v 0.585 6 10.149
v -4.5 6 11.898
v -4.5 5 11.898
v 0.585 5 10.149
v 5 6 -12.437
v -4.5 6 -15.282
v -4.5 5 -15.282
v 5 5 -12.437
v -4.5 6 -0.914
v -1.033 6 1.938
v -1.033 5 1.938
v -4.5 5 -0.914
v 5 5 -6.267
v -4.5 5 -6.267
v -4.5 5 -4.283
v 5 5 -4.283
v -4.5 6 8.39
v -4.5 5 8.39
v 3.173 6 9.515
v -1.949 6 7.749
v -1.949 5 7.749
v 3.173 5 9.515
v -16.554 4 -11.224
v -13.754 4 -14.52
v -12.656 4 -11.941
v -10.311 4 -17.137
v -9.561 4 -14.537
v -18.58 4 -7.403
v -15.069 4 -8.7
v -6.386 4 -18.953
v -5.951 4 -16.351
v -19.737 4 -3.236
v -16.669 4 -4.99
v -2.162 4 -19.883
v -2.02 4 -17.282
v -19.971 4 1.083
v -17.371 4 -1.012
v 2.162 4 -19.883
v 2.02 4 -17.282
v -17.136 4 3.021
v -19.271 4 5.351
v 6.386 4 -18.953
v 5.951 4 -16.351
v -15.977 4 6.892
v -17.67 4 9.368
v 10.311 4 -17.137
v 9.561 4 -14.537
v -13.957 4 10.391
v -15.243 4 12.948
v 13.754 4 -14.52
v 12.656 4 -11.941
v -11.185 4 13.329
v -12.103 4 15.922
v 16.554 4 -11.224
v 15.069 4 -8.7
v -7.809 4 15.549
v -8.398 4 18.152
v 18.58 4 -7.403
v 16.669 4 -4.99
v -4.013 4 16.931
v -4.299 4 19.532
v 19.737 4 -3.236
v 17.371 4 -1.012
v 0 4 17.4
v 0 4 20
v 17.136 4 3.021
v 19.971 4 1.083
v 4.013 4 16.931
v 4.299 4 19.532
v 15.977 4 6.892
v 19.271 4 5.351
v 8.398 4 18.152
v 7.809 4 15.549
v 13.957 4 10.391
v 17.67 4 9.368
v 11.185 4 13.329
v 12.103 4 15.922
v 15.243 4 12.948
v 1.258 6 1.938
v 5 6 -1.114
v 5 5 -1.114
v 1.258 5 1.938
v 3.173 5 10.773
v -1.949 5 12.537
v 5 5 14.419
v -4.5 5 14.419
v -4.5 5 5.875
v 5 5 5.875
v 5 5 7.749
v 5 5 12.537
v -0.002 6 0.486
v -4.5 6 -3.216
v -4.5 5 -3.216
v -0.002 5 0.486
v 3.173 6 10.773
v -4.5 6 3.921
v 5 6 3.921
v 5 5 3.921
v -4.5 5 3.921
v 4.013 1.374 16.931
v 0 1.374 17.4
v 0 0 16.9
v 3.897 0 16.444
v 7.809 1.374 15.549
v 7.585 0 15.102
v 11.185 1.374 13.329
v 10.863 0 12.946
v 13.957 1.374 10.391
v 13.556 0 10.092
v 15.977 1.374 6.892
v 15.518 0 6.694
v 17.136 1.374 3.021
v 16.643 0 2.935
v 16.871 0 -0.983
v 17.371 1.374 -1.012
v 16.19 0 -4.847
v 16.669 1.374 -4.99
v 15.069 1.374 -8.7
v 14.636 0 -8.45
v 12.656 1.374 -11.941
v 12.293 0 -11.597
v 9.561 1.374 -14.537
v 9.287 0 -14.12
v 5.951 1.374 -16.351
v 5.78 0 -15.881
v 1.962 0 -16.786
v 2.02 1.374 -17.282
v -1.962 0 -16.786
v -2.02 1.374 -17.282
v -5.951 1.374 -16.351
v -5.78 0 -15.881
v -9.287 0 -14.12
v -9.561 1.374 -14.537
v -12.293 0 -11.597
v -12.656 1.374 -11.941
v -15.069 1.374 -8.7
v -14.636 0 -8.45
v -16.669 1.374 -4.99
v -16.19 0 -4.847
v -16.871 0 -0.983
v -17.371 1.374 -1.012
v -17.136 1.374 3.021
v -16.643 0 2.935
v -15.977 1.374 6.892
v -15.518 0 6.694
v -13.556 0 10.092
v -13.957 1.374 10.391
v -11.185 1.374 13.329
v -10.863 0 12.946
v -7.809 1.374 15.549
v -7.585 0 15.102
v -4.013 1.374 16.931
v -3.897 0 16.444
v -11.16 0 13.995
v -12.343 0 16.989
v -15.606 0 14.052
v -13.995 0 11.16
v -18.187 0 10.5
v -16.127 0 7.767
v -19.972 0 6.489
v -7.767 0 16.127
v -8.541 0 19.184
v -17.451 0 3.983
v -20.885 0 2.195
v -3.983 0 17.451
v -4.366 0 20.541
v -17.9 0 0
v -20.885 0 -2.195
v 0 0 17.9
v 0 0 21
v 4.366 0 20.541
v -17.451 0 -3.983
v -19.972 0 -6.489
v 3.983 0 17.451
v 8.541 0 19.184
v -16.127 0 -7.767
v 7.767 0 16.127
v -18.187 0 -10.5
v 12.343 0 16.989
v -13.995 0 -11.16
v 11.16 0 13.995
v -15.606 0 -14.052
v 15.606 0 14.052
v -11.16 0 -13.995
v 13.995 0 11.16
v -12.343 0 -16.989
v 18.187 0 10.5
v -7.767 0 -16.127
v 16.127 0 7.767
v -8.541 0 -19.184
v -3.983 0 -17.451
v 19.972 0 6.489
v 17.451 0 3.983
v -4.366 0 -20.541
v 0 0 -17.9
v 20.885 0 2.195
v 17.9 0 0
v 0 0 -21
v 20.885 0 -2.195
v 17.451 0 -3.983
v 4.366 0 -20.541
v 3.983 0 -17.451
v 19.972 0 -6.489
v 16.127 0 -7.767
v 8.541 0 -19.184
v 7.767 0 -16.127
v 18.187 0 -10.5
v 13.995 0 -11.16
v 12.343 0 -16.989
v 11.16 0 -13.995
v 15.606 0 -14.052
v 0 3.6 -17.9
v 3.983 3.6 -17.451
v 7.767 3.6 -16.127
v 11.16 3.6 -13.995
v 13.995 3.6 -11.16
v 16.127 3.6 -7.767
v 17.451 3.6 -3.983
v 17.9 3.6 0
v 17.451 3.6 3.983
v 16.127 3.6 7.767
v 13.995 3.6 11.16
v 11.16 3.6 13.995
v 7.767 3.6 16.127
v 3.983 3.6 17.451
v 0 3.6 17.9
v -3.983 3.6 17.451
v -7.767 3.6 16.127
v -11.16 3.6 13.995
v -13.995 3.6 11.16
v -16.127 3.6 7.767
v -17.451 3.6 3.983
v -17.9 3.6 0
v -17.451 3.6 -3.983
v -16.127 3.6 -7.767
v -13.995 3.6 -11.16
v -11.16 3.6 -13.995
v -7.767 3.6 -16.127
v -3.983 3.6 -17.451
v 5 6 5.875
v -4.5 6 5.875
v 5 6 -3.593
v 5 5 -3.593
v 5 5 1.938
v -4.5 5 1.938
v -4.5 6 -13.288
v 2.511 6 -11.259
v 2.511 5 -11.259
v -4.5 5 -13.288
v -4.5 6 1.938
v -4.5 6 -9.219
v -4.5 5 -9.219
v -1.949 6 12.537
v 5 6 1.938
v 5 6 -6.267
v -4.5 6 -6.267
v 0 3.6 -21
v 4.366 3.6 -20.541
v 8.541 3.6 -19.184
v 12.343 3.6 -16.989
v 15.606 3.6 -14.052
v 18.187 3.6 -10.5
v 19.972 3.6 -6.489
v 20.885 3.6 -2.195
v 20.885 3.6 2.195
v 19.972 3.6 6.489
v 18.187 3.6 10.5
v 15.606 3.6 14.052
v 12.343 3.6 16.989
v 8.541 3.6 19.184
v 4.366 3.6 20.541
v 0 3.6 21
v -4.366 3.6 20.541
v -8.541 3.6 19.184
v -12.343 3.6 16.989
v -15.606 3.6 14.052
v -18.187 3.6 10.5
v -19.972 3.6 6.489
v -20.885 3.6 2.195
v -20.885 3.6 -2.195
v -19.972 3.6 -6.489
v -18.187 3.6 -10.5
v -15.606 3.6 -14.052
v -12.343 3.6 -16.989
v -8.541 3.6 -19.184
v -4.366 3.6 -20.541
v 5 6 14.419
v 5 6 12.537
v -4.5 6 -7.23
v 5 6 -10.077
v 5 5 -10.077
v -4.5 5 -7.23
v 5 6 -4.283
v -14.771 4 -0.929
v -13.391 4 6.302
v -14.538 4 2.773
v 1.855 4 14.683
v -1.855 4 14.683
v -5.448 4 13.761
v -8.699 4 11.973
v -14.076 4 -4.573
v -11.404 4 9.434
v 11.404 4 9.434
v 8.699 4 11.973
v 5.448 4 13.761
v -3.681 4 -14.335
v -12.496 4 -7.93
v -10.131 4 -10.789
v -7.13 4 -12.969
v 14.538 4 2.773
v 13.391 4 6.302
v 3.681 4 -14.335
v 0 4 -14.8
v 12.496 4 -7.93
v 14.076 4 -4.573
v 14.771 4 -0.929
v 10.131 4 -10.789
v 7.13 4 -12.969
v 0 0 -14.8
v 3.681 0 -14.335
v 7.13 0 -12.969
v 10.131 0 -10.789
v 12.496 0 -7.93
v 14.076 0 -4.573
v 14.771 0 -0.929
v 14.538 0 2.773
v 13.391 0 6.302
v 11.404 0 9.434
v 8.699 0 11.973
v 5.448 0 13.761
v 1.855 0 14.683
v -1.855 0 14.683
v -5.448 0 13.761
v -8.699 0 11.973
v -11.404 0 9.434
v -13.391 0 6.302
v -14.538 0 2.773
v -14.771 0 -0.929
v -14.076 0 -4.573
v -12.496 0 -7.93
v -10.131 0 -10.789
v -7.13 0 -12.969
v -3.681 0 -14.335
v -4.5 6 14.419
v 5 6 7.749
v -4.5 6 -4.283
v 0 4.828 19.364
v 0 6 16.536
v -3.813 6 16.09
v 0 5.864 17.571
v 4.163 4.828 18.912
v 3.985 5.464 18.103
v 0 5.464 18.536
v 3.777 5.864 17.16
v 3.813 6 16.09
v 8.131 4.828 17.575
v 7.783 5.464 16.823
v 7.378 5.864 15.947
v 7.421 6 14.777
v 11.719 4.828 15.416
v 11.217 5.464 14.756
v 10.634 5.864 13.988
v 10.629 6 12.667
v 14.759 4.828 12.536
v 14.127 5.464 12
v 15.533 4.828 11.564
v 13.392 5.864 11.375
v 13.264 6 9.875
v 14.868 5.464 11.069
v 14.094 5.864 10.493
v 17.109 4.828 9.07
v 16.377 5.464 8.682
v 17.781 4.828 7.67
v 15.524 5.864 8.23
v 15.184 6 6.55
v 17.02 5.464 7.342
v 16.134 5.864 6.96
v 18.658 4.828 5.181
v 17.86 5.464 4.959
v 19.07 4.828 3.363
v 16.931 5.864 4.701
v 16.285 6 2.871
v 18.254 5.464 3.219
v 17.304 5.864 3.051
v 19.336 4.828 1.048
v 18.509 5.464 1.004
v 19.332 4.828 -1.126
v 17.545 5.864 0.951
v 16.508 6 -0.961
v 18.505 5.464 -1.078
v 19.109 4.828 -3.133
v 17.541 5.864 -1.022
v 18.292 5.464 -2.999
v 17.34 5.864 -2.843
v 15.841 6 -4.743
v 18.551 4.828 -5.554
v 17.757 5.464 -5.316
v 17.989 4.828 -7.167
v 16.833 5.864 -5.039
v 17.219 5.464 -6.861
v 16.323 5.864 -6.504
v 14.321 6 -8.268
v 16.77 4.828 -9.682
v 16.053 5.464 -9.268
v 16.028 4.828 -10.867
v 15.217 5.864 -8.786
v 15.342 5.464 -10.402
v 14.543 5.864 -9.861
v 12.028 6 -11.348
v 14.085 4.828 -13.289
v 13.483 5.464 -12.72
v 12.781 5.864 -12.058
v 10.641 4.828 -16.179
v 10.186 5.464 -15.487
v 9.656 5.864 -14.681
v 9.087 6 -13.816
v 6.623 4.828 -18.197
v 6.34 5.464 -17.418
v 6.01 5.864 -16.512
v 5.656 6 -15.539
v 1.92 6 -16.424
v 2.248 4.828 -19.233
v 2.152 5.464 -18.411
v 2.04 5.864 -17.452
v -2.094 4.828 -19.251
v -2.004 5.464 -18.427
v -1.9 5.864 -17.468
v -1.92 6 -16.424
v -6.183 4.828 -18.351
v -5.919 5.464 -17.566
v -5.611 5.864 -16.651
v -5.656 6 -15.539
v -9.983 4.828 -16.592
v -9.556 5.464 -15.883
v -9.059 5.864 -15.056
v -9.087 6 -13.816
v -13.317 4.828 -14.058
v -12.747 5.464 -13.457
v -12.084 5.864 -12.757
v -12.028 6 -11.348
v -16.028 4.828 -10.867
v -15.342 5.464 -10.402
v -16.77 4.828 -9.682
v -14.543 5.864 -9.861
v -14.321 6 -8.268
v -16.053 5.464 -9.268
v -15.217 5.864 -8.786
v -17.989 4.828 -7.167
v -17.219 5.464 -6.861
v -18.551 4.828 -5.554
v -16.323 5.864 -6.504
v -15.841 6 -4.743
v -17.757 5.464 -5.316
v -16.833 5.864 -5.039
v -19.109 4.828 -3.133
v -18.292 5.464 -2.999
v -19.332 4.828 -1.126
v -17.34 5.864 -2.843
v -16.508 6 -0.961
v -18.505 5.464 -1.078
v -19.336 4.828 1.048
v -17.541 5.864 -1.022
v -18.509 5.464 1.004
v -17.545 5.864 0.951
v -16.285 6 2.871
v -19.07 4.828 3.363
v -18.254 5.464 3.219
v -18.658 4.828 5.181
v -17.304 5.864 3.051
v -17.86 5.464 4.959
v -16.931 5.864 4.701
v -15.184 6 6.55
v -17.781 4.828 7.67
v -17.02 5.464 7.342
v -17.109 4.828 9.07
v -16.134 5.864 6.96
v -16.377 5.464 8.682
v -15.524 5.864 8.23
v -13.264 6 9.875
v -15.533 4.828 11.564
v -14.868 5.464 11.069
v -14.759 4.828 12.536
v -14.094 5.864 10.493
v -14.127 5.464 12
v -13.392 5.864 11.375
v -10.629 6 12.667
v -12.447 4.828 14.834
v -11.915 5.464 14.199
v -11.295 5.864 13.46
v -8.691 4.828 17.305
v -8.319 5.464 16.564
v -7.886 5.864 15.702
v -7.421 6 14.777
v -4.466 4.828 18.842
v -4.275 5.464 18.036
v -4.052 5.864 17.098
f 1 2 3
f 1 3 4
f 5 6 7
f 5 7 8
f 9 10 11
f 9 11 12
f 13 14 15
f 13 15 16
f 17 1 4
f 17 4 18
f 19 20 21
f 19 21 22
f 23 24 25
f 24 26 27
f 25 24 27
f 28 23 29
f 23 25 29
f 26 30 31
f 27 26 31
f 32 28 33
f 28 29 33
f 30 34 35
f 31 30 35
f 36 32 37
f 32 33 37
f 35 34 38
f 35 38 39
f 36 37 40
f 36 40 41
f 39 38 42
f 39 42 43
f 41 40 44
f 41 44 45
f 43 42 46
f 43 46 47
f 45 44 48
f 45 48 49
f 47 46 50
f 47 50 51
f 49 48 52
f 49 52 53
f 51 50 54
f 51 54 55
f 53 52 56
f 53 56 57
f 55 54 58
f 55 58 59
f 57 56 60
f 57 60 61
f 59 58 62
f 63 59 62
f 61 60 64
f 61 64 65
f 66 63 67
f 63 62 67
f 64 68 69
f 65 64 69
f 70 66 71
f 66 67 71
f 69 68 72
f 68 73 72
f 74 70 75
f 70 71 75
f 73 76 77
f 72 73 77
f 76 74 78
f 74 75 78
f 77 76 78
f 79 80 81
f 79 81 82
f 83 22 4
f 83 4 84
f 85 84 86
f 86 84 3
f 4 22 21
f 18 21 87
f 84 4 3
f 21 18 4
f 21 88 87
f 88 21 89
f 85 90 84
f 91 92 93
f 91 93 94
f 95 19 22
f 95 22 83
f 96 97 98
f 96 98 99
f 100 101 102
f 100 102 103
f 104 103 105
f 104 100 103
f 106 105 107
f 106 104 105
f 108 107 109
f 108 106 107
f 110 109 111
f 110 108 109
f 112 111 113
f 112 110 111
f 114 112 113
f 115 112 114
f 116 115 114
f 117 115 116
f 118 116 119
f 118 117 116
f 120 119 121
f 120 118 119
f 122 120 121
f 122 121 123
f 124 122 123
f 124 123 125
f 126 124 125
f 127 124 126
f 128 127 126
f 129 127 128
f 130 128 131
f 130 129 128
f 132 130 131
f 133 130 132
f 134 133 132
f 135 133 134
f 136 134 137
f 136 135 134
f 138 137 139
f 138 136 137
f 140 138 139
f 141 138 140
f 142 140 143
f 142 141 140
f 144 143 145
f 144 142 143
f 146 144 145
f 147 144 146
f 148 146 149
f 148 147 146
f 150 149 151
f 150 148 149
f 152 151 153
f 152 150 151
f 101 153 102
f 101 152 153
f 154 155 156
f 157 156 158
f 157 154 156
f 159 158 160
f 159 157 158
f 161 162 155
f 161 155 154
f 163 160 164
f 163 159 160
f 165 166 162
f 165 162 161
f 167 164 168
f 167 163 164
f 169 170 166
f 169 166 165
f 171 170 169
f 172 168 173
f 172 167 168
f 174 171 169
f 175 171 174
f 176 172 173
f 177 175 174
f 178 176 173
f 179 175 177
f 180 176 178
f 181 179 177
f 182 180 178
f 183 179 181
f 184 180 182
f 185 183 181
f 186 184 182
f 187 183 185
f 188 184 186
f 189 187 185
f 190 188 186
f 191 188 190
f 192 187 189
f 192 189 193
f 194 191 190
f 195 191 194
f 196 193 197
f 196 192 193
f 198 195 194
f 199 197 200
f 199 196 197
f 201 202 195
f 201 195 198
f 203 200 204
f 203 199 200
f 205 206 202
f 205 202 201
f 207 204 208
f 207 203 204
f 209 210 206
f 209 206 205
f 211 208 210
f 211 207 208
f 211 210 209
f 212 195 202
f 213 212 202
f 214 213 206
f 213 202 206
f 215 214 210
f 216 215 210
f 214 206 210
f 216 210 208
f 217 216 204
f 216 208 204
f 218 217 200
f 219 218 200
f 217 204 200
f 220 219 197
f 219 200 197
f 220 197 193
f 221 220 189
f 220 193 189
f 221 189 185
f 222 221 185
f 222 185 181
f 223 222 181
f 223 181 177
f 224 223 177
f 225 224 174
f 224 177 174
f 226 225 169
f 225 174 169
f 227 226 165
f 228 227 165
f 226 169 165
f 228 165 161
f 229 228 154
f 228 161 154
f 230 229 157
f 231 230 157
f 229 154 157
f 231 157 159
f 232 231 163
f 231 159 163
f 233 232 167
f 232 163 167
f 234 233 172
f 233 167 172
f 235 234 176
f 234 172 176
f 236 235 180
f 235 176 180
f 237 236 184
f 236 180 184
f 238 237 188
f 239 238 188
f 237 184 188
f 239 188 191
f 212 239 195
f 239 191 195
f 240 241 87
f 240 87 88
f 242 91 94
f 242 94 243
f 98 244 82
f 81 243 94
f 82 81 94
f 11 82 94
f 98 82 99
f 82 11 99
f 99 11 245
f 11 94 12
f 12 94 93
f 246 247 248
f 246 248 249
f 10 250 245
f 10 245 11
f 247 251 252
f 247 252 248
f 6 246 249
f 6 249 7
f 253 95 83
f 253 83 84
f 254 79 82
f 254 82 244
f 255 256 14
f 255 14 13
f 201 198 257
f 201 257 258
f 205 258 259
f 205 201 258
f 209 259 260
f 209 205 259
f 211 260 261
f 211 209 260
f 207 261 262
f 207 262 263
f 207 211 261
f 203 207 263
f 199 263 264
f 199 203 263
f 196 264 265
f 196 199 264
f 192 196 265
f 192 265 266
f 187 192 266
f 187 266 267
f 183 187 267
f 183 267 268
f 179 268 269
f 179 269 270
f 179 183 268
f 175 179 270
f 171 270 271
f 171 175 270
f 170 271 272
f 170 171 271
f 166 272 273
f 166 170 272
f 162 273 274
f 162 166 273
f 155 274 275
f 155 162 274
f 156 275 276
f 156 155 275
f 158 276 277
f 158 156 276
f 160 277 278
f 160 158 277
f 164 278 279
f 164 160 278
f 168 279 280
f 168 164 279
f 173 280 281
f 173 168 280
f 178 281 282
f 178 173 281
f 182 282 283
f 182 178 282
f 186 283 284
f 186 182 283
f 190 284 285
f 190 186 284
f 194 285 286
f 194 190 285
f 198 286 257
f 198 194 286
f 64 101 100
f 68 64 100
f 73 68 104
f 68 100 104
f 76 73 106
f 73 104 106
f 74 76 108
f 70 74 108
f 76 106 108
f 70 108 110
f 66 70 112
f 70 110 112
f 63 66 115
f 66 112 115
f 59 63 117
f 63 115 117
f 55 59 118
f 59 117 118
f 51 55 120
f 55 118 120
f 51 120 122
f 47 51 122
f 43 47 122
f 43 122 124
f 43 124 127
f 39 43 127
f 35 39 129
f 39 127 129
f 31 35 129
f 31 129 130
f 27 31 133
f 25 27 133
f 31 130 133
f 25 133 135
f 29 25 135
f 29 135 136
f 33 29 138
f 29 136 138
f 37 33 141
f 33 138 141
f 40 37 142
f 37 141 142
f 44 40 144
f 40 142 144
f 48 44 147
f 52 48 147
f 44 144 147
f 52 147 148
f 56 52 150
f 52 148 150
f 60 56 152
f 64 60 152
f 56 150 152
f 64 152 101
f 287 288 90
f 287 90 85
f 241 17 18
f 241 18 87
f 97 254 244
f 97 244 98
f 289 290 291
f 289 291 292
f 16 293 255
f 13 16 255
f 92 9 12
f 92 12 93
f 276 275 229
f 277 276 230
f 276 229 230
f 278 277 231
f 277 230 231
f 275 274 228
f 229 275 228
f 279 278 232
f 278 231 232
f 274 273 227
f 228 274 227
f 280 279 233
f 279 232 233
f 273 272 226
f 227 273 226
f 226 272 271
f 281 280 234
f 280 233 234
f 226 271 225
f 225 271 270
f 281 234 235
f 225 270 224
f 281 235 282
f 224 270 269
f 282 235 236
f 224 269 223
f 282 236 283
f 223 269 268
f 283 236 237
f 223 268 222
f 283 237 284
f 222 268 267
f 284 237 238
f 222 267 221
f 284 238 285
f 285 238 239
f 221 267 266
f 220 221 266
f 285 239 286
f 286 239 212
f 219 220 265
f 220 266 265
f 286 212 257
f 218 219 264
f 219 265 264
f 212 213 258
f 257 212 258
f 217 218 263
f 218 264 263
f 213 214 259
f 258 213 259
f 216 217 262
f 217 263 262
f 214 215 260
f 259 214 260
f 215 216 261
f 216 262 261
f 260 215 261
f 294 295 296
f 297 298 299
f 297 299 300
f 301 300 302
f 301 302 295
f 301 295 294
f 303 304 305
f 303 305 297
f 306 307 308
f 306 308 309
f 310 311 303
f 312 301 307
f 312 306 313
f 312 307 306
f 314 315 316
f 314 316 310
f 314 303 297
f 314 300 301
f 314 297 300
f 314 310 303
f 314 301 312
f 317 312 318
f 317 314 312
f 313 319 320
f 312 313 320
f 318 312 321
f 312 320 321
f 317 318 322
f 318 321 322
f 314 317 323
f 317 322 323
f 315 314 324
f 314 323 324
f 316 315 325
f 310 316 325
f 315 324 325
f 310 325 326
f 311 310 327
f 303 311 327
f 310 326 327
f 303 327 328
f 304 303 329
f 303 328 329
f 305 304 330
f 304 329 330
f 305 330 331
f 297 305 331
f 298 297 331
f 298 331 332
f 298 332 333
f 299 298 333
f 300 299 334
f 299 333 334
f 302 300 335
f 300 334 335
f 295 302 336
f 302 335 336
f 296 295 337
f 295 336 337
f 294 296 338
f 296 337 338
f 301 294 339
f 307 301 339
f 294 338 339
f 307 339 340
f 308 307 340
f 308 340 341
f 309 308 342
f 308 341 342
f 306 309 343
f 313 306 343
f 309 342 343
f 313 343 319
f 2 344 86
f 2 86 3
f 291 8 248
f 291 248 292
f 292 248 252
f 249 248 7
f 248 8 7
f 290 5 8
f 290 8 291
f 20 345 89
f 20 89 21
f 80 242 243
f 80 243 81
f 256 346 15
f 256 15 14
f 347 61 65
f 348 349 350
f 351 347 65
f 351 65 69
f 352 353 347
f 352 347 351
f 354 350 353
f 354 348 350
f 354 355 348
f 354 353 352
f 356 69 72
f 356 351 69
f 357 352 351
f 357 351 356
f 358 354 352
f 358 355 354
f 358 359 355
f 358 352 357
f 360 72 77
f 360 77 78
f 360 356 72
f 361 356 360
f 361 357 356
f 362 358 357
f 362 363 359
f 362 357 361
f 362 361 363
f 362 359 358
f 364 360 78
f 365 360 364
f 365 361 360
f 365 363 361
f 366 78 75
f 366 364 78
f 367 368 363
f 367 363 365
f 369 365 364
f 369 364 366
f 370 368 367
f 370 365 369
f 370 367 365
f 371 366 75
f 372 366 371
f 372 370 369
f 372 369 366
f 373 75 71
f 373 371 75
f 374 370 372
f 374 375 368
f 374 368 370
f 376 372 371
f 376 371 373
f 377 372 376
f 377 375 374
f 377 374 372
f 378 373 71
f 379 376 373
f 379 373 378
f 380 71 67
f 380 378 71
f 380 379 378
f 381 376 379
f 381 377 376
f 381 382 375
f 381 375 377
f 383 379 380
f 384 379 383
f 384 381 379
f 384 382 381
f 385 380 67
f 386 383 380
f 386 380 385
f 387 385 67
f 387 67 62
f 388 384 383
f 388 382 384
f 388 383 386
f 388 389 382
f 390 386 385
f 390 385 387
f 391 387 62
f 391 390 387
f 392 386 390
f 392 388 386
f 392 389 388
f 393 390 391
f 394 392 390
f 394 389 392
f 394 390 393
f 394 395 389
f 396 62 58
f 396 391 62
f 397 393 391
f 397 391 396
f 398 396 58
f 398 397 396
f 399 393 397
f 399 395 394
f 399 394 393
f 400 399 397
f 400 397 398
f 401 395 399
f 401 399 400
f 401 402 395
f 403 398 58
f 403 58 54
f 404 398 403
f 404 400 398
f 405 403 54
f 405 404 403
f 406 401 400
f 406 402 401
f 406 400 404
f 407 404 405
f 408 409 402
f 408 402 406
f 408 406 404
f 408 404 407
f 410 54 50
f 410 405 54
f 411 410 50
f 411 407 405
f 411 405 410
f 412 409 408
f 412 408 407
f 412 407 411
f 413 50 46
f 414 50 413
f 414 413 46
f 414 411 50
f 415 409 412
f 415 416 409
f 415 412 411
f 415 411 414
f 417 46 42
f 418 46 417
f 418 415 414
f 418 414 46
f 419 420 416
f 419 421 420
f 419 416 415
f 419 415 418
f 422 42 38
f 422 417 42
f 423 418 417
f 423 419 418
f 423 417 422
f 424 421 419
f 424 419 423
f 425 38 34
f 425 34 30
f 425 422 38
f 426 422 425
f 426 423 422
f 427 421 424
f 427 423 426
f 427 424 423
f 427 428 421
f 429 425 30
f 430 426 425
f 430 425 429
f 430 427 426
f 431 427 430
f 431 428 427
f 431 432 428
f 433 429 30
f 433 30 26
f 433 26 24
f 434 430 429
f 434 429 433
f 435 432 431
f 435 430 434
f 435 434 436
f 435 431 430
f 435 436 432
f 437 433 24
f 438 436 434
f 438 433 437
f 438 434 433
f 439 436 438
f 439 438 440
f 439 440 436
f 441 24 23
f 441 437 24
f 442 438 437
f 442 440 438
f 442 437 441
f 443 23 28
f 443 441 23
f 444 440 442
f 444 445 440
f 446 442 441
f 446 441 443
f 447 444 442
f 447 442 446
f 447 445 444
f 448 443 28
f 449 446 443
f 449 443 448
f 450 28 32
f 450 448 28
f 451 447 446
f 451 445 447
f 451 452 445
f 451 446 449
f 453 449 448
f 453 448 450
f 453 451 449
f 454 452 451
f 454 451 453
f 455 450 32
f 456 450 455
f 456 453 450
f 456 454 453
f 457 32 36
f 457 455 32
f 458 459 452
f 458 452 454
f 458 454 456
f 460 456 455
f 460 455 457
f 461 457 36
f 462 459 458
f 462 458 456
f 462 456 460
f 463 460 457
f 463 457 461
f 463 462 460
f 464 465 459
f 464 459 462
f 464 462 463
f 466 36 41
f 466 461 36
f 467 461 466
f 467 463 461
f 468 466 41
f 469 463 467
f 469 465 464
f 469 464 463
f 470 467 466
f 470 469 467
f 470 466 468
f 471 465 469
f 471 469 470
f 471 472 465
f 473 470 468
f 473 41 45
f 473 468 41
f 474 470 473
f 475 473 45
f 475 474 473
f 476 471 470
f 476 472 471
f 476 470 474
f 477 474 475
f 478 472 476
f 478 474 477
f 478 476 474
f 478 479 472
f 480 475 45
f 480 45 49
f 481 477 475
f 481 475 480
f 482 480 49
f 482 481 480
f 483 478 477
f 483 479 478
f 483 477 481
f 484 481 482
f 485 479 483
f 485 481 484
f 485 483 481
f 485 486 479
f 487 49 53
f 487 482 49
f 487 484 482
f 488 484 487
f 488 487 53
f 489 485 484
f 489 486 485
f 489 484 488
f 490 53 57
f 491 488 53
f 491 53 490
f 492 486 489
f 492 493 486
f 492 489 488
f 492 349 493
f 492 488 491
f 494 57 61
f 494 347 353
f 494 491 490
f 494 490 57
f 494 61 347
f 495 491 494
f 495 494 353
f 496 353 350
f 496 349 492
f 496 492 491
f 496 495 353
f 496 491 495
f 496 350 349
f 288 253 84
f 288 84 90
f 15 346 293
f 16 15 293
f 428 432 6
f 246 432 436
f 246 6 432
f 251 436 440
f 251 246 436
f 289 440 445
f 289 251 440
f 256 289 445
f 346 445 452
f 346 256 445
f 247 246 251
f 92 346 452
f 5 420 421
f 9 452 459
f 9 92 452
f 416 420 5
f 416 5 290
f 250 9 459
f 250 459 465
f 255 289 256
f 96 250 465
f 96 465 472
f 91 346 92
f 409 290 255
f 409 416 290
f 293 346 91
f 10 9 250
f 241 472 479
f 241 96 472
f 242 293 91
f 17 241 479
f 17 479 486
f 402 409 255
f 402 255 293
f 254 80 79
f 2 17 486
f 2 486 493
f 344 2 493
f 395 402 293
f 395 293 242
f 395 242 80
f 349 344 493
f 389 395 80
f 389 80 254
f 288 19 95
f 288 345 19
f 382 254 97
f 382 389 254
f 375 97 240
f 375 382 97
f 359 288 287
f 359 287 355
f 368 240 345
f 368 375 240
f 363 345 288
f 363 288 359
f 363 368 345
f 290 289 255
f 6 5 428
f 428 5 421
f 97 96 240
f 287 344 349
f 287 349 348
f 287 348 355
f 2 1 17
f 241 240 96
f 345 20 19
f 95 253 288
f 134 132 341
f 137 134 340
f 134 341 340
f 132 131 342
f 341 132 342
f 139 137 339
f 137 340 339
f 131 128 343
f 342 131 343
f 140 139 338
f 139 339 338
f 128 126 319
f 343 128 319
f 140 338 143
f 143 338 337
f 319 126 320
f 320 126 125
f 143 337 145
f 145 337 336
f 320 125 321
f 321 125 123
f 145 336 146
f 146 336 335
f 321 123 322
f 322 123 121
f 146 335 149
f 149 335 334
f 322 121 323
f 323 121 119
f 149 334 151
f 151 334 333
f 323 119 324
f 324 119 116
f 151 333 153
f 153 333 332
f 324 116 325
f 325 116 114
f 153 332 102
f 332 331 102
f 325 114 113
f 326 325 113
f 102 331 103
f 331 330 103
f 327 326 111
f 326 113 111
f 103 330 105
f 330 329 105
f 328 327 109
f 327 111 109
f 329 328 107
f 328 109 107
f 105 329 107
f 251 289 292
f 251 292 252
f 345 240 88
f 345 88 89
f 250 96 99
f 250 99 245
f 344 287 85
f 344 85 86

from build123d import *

# Parameters (mm, degrees)
SKETCH1_R           = 17.4
BOSS_EXTRUDE1_DEPTH = 4
SKETCH2_R           = 20
BOSS_EXTRUDE2_DEPTH = 2
CHAMFER1_SIZE       = 0.5
CHAMFER1_SIZE2      = 1.37373871
SKETCH4_R           = 21
SKETCH4_R_2         = 17.9
BOSS_EXTRUDE4_DEPTH = 3.6
FILLET1_R           = 4
SKETCH3_W           = 9.5
SKETCH3_H           = 1.983330026
CUT_EXTRUDE1_DEPTH  = 1
SKETCH5_R           = 14.8
CUT_EXTRUDE2_DEPTH  = 4


with BuildPart() as part:
    # Sketch1 → Boss-Extrude1 (new body)
    with BuildSketch(Plane(origin=(0, 0, 0), x_dir=(1, 0, 0), z_dir=(0, 1, 0))):
        with Locations(Location((0, 0, 0), (0, 0, 270))):
            Circle(SKETCH1_R)
    extrude(amount=BOSS_EXTRUDE1_DEPTH)

    # Sketch2 → Boss-Extrude2 (add)
    with BuildSketch(Plane(origin=(0, 4, 0), x_dir=(1, 0, 0), z_dir=(0, 1, 0))):
        with Locations(Location((0, 0, 0), (0, 0, 270))):
            Circle(SKETCH2_R)
    extrude(amount=BOSS_EXTRUDE2_DEPTH)

    # Chamfer1
    chamfer1_edges = [part.edges().sort_by_distance(p)[0] for p in [
        (0, 0, -17.4),
    ]]
    chamfer1_side = [part.faces().sort_by_distance(p)[0] for p in [
        (0, 0, 0),
    ]]
    chamfer(chamfer1_edges, length=CHAMFER1_SIZE, length2=CHAMFER1_SIZE2, reference=chamfer1_side[0])

    # Fillet1
    # the kernel refuses this fillet: 4 mm, written as the material it takes off along each edge
    with BuildSketch(Plane(origin=(0, 6, 0), x_dir=(0, 0, 1), z_dir=(-1, 0, 0))) as fillet1_piece_1:
        with BuildLine():
            CenterArc((16.535898385, -4), FILLET1_R, 30, 60)
            Line((16.535898385, 0), (16.535898385, 0.08))
            Line((16.535898385, 0.08), (20, 0.08))
            Line((20, 0.08), (20.08, 0))
            ThreePointArc((20.08, 0), (20.08, -1), (20.069282032, -1.96))
            Line((20.069282032, -1.96), (20, -2))
        make_face()
    revolve(axis=Axis((0, 6, 0), (0, 1, 0)), mode=Mode.SUBTRACT)

    # Sketch3 → Cut-Extrude1 (cut)
    with BuildSketch(Plane(origin=(0, 6, 0), x_dir=(1, 0, 0), z_dir=(0, 1, 0))):
        Polygon((-4.5, -14.418733876), (-4.5, -11.89809486), (0.584639809, -10.148541377), (-4.5, -8.389561421), (-4.5, -5.874578289), (5, -5.874578289), (5, -7.748561222), (-1.949196269, -7.748561222), (3.173149434, -9.515082358), (3.173149434, -10.772573923), (-1.949196269, -12.537209764), (5, -12.537209764), (5, -14.418733876), align=None)
        Polygon((-4.5, -3.921412979), (-4.5, -1.938082953), (-1.032943044, -1.938082953), (-4.5, 0.91436793), (-4.5, 3.21631276), (-0.001686843, -0.486406033), (5, 3.593371701), (5, 1.114209168), (1.257690018, -1.938082953), (5, -1.938082953), (5, -3.921412979), align=None)
        with Locations((0.25, 5.275054574)):
            Rectangle(SKETCH3_W, SKETCH3_H)
        Polygon((-4.5, 7.23010518), (-4.5, 9.21909109), (2.511410994, 11.258979956), (-4.5, 13.287557055), (-4.5, 15.282198849), (5, 12.437289145), (5, 10.076900179), align=None)
    extrude(amount=-CUT_EXTRUDE1_DEPTH, mode=Mode.SUBTRACT)

    # Sketch5 → Cut-Extrude2 (cut)
    with BuildSketch(Plane.XZ):
        with Locations(Location((0, 0, 0), (0, 0, 270))):
            Circle(SKETCH5_R)
    extrude(amount=-CUT_EXTRUDE2_DEPTH, mode=Mode.SUBTRACT)


with BuildPart() as body_2:
    # Sketch4 → Boss-Extrude4 (new body)
    with BuildSketch(Plane.XZ):
        with Locations(Location((0, 0, 0), (0, 0, 270))):
            Circle(SKETCH4_R)
        with Locations(Location((0, 0, 0), (0, 0, 270))):
            Circle(SKETCH4_R_2, mode=Mode.SUBTRACT)
    extrude(amount=-BOSS_EXTRUDE4_DEPTH)


solid = Compound([part.part, body_2.part])
